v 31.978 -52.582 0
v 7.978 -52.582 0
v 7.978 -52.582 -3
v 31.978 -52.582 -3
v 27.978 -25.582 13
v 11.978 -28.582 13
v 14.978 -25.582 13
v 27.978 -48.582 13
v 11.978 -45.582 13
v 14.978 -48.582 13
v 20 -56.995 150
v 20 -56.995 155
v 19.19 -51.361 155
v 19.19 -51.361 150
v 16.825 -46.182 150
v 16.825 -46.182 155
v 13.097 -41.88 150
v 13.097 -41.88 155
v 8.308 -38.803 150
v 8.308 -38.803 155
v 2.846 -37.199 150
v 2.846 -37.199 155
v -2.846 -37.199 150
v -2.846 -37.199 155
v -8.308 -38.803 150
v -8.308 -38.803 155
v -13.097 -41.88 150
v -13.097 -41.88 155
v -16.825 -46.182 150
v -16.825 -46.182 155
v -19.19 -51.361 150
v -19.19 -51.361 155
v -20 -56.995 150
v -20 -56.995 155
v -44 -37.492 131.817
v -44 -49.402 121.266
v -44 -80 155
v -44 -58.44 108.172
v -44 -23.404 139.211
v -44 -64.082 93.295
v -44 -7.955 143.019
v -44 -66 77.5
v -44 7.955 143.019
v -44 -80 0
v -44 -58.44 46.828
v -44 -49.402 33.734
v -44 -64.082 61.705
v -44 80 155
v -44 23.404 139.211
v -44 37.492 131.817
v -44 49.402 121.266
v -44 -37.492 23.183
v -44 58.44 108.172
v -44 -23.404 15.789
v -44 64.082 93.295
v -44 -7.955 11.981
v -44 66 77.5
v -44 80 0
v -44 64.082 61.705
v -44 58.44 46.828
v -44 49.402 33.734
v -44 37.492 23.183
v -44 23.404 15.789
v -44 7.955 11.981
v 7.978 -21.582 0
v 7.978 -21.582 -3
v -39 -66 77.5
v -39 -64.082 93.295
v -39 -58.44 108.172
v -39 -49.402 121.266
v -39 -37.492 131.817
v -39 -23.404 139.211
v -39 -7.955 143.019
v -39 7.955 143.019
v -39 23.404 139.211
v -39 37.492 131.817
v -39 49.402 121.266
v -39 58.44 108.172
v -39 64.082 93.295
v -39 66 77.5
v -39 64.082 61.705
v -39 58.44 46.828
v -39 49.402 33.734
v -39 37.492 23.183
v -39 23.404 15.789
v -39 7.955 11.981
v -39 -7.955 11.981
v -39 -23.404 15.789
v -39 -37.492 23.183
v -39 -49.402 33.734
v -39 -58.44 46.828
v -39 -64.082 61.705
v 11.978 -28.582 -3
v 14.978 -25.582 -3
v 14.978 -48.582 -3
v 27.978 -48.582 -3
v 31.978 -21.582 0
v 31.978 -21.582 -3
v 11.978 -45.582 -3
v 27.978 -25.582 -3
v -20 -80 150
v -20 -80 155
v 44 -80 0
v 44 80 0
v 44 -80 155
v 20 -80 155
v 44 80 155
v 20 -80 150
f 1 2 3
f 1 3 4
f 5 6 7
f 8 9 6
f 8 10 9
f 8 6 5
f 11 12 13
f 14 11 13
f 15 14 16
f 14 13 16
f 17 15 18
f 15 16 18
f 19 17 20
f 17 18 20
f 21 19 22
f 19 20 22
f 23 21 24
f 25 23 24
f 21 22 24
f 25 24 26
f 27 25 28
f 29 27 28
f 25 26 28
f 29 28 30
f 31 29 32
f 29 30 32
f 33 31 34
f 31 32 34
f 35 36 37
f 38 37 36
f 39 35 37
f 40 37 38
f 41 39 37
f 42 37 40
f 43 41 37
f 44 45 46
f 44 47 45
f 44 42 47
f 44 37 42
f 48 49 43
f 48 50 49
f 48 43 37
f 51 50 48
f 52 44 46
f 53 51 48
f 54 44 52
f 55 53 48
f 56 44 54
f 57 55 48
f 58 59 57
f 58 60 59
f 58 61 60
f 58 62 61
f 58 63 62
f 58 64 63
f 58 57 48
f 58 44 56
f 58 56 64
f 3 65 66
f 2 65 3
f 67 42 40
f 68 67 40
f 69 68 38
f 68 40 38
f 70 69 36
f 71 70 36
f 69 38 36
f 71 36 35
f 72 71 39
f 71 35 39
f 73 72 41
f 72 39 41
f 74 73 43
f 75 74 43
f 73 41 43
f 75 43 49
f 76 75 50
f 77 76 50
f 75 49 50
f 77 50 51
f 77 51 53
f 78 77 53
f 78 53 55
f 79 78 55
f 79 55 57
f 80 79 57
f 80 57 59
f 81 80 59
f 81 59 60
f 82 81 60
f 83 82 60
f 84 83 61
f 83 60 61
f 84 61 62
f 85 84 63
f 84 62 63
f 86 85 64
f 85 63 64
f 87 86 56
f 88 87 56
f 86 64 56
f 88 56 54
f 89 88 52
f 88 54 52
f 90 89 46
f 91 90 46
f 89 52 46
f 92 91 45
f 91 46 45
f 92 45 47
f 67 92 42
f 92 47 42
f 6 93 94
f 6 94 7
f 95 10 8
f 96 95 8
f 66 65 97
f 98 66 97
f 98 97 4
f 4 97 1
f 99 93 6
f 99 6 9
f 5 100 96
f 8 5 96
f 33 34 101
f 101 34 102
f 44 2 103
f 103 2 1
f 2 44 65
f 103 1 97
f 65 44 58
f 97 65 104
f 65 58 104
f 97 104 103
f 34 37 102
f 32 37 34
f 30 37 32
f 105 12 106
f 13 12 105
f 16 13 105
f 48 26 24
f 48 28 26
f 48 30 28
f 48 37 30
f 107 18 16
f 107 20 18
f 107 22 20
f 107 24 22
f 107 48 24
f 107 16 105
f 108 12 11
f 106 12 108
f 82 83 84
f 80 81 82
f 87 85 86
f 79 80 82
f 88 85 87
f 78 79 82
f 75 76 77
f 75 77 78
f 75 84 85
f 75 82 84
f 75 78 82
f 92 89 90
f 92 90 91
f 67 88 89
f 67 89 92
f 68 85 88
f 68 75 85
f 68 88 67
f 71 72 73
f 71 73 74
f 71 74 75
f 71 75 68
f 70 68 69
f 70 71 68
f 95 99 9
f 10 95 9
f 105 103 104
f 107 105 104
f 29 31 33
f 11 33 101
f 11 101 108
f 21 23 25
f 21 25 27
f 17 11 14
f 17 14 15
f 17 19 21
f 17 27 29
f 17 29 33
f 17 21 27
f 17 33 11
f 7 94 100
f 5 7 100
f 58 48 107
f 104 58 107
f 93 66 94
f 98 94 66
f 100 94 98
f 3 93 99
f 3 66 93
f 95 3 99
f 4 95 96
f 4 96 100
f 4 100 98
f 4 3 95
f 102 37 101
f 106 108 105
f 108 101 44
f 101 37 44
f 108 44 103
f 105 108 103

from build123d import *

# Parameters (mm, degrees)
SKETCH_W        = 88
SKETCH_H        = 160
PAD_DEPTH       = 155
SKETCH001_R     = 66
POCKET_DEPTH    = 5
POCKET001_DEPTH = 5
SKETCH003_W     = 24
SKETCH003_H     = 31
PAD001_DEPTH    = 3
SKETCH004_W     = 16
SKETCH004_H     = 23
POCKET002_DEPTH = 16
CHAMFER_SIZE    = 3


with BuildPart() as part:
    # Sketch (on XY_Plane of Origin) → Pad (new body)
    with BuildSketch(Plane.XY):
        Rectangle(SKETCH_W, SKETCH_H)
    extrude(amount=PAD_DEPTH)

    # Sketch001 (on Face4 of Pad) → Pocket (cut)
    with BuildSketch(Plane(origin=(-44, 0, 0), x_dir=(0, -1, 0), z_dir=(-1, 0, 0))):
        with Locations((0, 77.5)):
            Circle(SKETCH001_R)
    extrude(amount=-POCKET_DEPTH, mode=Mode.SUBTRACT)

    # Sketch002 (on Face5 of Pocket) → Pocket001 (cut)
    with BuildSketch(Plane.XY.offset(155)):
        with BuildLine():
            ThreePointArc((20, -56.995285), (0, -36.995285), (-20, -56.995285))
            Line((-20, -56.995285), (-20, -80))
            Line((-20, -80), (20, -80))
            Line((20, -56.995285), (20, -80))
        make_face()
    extrude(amount=-POCKET001_DEPTH, mode=Mode.SUBTRACT)

    # Sketch003 (on Face2 of Pocket001) → Pad001 (join)
    with BuildSketch(Plane(origin=(0, 0, 0), x_dir=(1, 0, 0), z_dir=(0, 0, -1))):
        with Locations((19.978081, 37.081905)):
            Rectangle(SKETCH003_W, SKETCH003_H)
    extrude(amount=PAD001_DEPTH)

    # Sketch004 (on Face16 of Pad001) → Pocket002 (cut)
    with BuildSketch(Plane(origin=(0, 0, -3), x_dir=(1, 0, 0), z_dir=(0, 0, -1))):
        with Locations((19.978081, 37.081905)):
            Rectangle(SKETCH004_W, SKETCH004_H)
    extrude(amount=-POCKET002_DEPTH, mode=Mode.SUBTRACT)

    # Chamfer
    chamfer_edges = [part.edges().sort_by_distance(p)[0] for p in [
        (11.978081, -25.581905, 5),
        (11.978081, -48.581905, 5),
    ]]
    chamfer(chamfer_edges, length=CHAMFER_SIZE)


solid = part.part
